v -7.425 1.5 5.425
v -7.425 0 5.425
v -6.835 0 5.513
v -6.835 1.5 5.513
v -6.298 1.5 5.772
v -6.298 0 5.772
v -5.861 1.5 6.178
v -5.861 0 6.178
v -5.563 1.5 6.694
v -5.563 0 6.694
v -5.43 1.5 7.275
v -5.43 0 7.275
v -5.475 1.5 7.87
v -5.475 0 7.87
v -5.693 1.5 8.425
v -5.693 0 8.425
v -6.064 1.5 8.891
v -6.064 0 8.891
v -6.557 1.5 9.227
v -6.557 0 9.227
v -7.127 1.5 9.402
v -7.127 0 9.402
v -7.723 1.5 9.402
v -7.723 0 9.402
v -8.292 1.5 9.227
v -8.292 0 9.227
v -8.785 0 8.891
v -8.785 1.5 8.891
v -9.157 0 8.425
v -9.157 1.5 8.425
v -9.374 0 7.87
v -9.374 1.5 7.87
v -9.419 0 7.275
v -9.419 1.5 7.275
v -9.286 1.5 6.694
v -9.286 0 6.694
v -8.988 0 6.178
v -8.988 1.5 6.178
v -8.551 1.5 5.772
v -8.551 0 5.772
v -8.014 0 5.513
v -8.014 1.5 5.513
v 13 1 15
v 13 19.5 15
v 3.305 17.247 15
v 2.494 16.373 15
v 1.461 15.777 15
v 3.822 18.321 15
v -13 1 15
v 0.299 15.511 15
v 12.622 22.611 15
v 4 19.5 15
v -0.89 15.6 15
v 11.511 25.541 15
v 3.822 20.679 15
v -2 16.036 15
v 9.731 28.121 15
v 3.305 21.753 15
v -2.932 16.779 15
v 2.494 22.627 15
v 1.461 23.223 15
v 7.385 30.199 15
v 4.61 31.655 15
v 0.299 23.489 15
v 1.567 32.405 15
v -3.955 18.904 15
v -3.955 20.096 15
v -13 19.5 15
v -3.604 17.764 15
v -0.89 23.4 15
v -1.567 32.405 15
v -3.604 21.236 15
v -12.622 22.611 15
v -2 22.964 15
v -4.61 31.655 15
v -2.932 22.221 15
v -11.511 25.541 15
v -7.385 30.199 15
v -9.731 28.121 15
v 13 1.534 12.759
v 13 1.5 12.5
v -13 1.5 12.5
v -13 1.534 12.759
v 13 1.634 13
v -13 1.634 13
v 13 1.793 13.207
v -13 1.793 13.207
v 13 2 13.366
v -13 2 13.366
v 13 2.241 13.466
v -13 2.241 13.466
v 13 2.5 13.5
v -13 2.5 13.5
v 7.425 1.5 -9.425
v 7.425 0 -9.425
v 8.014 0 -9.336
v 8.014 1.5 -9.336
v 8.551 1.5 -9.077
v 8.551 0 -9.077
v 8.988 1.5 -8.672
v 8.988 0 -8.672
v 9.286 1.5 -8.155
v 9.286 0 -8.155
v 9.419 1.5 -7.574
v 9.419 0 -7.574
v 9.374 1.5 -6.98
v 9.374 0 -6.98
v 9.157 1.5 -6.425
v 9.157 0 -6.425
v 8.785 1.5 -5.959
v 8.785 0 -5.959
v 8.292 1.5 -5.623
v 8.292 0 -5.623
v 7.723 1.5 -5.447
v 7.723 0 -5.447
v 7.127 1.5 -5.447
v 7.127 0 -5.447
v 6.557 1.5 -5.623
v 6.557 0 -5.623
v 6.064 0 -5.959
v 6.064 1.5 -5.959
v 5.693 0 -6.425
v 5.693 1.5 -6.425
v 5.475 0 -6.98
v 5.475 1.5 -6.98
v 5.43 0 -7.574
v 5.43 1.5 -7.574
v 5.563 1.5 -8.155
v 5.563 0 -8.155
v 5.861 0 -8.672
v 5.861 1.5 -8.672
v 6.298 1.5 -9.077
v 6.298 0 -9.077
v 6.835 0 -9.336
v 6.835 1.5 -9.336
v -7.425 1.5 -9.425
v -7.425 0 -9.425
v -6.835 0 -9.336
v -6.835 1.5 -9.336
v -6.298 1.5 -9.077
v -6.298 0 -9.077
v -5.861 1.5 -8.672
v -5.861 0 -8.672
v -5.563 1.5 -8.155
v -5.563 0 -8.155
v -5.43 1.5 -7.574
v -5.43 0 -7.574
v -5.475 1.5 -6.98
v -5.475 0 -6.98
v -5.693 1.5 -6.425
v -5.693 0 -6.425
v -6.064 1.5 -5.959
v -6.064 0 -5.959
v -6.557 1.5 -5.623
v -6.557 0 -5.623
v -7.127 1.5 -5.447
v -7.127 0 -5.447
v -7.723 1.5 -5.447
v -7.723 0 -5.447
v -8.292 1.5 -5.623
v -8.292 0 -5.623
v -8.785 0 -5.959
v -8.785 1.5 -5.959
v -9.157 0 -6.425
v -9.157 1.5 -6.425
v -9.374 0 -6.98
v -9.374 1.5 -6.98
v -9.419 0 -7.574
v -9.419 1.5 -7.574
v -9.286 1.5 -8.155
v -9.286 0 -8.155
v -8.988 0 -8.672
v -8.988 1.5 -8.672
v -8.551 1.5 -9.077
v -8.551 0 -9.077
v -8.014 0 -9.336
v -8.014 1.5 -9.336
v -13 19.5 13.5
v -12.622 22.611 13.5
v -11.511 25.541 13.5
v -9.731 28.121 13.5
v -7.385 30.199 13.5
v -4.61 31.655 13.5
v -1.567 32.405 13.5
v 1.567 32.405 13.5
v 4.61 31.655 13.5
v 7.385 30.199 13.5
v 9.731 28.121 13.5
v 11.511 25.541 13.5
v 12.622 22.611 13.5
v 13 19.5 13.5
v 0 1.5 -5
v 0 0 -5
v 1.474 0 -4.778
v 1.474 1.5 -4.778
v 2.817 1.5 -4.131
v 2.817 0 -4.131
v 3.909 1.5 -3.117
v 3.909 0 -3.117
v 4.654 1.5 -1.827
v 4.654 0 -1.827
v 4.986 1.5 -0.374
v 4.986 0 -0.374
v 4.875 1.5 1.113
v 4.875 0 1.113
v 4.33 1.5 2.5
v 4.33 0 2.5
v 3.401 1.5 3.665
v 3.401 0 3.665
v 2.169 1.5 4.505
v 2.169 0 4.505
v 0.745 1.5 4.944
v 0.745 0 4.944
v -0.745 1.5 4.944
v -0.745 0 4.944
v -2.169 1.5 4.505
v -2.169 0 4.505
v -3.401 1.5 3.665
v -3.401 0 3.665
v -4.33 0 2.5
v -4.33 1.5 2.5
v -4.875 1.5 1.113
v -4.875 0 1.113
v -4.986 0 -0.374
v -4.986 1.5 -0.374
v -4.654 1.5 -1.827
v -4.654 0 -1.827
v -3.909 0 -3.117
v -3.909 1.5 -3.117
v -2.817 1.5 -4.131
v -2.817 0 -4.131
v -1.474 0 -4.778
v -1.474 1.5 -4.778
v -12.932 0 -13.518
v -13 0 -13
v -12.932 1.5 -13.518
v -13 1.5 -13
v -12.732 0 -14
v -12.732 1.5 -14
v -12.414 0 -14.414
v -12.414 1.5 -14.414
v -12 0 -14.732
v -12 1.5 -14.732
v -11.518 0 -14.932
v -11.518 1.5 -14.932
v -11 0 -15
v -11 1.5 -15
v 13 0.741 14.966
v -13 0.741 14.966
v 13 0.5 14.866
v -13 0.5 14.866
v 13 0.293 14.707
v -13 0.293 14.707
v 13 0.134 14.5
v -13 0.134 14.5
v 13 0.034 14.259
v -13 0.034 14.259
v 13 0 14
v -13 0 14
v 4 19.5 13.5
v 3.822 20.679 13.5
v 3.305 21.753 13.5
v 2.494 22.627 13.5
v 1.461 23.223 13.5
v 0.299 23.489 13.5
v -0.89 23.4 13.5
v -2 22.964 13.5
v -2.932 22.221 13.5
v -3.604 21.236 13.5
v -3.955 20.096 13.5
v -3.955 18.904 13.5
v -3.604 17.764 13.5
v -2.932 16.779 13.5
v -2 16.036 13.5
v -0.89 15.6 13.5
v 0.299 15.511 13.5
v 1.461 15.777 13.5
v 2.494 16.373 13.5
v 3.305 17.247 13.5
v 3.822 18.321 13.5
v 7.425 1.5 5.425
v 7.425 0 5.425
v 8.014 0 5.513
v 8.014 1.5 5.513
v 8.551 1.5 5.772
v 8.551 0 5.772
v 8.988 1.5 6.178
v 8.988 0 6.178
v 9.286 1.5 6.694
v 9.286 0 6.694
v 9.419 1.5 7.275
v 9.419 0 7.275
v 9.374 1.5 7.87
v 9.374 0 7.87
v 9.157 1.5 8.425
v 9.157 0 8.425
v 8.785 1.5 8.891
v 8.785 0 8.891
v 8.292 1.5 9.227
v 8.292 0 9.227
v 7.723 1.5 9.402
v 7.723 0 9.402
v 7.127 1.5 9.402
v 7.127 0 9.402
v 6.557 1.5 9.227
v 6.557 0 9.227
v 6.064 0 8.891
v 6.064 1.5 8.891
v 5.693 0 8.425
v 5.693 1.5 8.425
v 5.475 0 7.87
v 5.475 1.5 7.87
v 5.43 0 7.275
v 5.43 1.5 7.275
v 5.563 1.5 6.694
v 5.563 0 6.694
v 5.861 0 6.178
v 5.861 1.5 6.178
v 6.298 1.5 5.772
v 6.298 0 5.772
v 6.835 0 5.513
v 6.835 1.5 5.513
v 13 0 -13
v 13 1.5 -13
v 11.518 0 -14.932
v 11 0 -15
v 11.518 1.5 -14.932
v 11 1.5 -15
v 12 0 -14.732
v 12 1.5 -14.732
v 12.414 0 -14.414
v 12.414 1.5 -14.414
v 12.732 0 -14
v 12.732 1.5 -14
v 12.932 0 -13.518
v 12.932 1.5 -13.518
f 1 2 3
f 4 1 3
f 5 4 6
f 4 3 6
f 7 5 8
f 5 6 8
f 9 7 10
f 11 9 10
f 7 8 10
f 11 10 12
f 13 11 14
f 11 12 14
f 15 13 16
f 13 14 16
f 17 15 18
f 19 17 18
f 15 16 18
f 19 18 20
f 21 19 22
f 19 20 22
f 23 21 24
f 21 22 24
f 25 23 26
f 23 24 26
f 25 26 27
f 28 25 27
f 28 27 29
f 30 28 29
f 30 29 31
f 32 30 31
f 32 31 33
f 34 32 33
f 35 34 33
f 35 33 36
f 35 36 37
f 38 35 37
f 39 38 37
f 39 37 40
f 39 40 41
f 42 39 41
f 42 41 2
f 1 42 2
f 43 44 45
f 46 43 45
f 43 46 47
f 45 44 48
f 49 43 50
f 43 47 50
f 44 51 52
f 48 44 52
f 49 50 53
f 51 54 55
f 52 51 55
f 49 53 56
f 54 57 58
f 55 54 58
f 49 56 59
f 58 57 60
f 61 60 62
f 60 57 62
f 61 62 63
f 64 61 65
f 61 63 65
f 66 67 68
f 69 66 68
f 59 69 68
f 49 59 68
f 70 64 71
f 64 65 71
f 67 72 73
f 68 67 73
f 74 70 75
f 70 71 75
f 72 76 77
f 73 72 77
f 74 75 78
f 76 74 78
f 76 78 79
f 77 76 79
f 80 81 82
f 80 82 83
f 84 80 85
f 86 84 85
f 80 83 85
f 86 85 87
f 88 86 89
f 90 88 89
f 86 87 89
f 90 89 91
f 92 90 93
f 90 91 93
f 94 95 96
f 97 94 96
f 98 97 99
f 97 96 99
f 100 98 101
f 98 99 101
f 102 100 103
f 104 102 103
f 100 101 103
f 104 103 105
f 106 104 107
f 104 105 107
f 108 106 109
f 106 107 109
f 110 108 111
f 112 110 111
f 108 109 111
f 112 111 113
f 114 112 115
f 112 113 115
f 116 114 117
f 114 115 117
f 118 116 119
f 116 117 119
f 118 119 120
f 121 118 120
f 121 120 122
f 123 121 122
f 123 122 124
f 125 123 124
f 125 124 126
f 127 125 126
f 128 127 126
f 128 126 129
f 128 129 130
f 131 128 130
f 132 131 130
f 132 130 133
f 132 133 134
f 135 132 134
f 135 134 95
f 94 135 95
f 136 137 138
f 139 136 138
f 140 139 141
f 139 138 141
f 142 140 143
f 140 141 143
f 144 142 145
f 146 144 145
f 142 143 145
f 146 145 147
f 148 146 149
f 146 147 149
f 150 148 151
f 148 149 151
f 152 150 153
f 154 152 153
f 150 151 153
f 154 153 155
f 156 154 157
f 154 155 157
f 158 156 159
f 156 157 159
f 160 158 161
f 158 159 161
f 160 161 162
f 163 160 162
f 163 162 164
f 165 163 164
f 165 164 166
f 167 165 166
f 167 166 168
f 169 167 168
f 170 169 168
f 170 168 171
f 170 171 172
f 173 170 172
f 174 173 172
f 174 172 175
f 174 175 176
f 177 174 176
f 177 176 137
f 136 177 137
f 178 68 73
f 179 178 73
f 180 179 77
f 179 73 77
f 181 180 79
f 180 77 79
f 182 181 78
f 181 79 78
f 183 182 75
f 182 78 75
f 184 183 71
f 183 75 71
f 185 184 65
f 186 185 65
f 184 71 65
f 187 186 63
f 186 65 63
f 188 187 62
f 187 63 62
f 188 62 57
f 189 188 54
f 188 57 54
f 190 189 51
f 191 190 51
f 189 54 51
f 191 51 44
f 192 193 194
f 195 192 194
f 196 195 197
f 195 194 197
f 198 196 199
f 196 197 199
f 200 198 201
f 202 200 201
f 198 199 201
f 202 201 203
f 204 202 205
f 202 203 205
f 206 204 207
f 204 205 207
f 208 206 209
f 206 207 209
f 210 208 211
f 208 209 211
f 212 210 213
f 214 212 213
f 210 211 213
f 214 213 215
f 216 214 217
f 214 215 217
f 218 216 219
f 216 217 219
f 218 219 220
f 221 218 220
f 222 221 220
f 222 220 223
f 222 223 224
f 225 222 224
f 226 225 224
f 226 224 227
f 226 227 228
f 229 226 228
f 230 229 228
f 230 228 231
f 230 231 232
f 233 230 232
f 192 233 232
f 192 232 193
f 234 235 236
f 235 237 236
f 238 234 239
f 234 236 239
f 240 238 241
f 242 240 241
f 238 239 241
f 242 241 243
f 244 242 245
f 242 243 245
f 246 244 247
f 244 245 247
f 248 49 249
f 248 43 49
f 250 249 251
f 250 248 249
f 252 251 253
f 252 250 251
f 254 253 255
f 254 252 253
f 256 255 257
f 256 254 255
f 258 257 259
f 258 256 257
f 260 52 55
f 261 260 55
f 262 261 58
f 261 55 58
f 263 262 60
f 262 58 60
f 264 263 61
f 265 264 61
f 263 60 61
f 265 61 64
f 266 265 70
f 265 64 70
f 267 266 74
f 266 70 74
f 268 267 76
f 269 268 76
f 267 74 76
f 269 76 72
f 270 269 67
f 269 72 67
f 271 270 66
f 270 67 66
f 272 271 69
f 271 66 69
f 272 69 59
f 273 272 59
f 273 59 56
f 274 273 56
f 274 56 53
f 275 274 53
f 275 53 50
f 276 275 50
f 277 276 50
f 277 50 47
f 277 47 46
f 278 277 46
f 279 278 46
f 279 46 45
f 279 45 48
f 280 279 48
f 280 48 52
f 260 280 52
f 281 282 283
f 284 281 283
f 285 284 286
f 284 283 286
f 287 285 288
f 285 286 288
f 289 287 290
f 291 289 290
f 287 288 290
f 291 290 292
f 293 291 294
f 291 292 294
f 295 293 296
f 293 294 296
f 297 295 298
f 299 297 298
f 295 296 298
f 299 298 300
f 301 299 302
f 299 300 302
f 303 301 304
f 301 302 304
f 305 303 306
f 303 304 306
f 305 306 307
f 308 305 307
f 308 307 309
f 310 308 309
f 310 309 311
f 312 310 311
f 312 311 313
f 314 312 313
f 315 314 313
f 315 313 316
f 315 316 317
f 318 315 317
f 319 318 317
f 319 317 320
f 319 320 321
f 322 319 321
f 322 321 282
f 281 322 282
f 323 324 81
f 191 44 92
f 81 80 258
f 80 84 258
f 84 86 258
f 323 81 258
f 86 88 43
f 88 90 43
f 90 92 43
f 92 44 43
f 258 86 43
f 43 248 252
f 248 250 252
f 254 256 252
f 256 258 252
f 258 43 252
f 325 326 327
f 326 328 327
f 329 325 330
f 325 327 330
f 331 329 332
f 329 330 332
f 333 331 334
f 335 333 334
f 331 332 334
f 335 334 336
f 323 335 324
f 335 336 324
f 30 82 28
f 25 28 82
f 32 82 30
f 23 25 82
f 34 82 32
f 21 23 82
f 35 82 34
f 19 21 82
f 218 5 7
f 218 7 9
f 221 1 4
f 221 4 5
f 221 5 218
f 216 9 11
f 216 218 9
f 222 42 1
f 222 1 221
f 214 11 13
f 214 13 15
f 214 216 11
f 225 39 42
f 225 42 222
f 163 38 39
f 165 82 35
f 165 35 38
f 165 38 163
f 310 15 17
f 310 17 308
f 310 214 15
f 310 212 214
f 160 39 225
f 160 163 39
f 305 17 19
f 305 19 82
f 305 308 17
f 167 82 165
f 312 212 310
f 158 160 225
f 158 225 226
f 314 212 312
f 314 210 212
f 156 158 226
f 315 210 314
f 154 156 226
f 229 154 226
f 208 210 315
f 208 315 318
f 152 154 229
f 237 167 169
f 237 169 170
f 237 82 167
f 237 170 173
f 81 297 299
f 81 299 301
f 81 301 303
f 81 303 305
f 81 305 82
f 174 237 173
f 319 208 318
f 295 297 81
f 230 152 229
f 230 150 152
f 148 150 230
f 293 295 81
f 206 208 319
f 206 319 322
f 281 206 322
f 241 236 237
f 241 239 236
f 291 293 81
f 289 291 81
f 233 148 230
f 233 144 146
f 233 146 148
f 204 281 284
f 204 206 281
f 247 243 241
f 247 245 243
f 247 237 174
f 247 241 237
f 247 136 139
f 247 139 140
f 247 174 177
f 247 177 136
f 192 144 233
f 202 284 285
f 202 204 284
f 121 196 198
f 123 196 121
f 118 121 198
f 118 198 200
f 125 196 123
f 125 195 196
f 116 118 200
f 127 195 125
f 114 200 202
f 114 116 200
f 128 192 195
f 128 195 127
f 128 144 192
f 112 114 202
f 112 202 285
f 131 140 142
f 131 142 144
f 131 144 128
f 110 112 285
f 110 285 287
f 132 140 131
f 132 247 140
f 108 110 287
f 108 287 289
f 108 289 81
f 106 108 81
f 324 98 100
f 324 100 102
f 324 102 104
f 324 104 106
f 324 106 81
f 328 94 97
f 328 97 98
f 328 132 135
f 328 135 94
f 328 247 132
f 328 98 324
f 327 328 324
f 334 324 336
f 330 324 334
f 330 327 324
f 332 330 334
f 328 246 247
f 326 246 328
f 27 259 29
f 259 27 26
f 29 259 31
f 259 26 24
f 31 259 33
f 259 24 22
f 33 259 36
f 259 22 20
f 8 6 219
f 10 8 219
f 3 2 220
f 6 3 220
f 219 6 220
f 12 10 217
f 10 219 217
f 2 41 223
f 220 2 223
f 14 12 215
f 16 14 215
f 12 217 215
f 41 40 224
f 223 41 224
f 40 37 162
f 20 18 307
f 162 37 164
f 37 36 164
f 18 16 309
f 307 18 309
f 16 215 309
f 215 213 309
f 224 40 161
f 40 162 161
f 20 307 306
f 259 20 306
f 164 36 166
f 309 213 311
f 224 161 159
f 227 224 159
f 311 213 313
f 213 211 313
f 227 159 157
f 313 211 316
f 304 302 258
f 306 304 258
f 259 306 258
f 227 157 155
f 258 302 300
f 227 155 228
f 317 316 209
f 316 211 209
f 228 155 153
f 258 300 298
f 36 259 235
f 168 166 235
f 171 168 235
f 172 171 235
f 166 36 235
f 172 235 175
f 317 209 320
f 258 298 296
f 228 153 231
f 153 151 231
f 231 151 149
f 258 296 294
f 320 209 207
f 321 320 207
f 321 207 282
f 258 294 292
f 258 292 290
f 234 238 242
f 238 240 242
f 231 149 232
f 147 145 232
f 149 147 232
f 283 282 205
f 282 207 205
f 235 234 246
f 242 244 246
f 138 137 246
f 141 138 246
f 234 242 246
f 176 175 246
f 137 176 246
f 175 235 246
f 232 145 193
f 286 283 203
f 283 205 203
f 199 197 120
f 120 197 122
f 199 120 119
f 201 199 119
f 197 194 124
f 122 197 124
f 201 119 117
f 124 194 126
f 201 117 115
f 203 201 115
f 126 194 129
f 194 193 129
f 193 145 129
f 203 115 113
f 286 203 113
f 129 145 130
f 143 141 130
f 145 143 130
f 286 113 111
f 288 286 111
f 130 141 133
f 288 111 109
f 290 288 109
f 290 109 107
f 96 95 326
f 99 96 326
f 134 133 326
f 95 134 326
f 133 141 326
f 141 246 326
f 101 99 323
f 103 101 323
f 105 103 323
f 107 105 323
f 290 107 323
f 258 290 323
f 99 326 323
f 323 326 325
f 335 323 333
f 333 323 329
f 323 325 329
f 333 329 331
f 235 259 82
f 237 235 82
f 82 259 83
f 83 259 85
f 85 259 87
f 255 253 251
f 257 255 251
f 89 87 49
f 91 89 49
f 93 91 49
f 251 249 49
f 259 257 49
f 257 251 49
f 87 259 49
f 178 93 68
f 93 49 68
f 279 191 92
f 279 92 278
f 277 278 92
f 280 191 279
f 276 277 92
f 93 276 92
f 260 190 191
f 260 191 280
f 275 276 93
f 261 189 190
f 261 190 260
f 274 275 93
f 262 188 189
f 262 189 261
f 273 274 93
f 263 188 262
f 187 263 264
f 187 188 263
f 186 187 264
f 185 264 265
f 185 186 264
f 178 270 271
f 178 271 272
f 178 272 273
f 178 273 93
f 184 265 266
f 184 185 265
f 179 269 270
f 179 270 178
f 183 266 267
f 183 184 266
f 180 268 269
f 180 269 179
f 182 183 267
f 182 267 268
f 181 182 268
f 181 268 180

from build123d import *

# Parameters (mm, degrees)
SKETCH1_W           = 26
SKETCH1_H           = 30
BOSS_EXTRUDE1_DEPTH = 1.5
BOSS_EXTRUDE2_DEPTH = 1.5
SKETCH4_R           = 4
CUT_EXTRUDE1_DEPTH  = 47.100433837
FILLET1_R           = 1
FILLET2_R           = 2
SKETCH5_R           = 5
SKETCH5_R_2         = 2
CUT_EXTRUDE2_DEPTH  = 39.082148049


with BuildPart() as part:
    # Sketch1 → Boss-Extrude1 (new body)
    with BuildSketch(Plane(origin=(0, 0, 0), x_dir=(1, 0, 0), z_dir=(0, 1, 0))):
        Rectangle(SKETCH1_W, SKETCH1_H)
    extrude(amount=BOSS_EXTRUDE1_DEPTH)

    # Sketch3 → Boss-Extrude2 (add)
    with BuildSketch(Plane.XY.offset(15)):
        with BuildLine():
            Line((-13, 1.5), (-13, 19.5))
            ThreePointArc((-13, 19.5), (0, 32.5), (13, 19.5))
            Line((13, 19.5), (13, 1.5))
            Line((13, 1.5), (-13, 1.5))
        make_face()
    extrude(amount=-BOSS_EXTRUDE2_DEPTH)

    # Sketch4 → Cut-Extrude1 (cut, through all)
    with BuildSketch(Plane.XY.offset(15)):
        with Locations((0, 19.5)):
            Circle(SKETCH4_R)
    extrude(amount=-CUT_EXTRUDE1_DEPTH, mode=Mode.SUBTRACT)

    # Fillet1
    fillet1_edges = [part.edges().sort_by_distance(p)[0] for p in [
        (0, 1.5, 13.5),
        (0, 0, 15),
    ]]
    fillet(fillet1_edges, radius=FILLET1_R)

    # Fillet2
    fillet2_edges = [part.edges().sort_by_distance(p)[0] for p in [
        (-13, 0.75, -15),
        (13, 0.75, -15),
    ]]
    fillet(fillet2_edges, radius=FILLET2_R)

    # Sketch5 → Cut-Extrude2 (cut, through all)
    with BuildSketch(Plane.XZ):
        with Locations(Location((0, 0, 0), (0, 0, 270))):
            Circle(SKETCH5_R)
        with Locations(Location((7.424621202, 7.424621202, 0), (0, 0, 270))):
            Circle(SKETCH5_R_2)
        with Locations(Location((-7.424621202, -7.424621202, 0), (0, 0, 270))):
            Circle(SKETCH5_R_2)
        with Locations(Location((-7.424621202, 7.424621202, 0), (0, 0, 270))):
            Circle(SKETCH5_R_2)
        with Locations(Location((7.424621202, -7.424621202, 0), (0, 0, 270))):
            Circle(SKETCH5_R_2)
    extrude(amount=-CUT_EXTRUDE2_DEPTH, mode=Mode.SUBTRACT)


solid = part.part
